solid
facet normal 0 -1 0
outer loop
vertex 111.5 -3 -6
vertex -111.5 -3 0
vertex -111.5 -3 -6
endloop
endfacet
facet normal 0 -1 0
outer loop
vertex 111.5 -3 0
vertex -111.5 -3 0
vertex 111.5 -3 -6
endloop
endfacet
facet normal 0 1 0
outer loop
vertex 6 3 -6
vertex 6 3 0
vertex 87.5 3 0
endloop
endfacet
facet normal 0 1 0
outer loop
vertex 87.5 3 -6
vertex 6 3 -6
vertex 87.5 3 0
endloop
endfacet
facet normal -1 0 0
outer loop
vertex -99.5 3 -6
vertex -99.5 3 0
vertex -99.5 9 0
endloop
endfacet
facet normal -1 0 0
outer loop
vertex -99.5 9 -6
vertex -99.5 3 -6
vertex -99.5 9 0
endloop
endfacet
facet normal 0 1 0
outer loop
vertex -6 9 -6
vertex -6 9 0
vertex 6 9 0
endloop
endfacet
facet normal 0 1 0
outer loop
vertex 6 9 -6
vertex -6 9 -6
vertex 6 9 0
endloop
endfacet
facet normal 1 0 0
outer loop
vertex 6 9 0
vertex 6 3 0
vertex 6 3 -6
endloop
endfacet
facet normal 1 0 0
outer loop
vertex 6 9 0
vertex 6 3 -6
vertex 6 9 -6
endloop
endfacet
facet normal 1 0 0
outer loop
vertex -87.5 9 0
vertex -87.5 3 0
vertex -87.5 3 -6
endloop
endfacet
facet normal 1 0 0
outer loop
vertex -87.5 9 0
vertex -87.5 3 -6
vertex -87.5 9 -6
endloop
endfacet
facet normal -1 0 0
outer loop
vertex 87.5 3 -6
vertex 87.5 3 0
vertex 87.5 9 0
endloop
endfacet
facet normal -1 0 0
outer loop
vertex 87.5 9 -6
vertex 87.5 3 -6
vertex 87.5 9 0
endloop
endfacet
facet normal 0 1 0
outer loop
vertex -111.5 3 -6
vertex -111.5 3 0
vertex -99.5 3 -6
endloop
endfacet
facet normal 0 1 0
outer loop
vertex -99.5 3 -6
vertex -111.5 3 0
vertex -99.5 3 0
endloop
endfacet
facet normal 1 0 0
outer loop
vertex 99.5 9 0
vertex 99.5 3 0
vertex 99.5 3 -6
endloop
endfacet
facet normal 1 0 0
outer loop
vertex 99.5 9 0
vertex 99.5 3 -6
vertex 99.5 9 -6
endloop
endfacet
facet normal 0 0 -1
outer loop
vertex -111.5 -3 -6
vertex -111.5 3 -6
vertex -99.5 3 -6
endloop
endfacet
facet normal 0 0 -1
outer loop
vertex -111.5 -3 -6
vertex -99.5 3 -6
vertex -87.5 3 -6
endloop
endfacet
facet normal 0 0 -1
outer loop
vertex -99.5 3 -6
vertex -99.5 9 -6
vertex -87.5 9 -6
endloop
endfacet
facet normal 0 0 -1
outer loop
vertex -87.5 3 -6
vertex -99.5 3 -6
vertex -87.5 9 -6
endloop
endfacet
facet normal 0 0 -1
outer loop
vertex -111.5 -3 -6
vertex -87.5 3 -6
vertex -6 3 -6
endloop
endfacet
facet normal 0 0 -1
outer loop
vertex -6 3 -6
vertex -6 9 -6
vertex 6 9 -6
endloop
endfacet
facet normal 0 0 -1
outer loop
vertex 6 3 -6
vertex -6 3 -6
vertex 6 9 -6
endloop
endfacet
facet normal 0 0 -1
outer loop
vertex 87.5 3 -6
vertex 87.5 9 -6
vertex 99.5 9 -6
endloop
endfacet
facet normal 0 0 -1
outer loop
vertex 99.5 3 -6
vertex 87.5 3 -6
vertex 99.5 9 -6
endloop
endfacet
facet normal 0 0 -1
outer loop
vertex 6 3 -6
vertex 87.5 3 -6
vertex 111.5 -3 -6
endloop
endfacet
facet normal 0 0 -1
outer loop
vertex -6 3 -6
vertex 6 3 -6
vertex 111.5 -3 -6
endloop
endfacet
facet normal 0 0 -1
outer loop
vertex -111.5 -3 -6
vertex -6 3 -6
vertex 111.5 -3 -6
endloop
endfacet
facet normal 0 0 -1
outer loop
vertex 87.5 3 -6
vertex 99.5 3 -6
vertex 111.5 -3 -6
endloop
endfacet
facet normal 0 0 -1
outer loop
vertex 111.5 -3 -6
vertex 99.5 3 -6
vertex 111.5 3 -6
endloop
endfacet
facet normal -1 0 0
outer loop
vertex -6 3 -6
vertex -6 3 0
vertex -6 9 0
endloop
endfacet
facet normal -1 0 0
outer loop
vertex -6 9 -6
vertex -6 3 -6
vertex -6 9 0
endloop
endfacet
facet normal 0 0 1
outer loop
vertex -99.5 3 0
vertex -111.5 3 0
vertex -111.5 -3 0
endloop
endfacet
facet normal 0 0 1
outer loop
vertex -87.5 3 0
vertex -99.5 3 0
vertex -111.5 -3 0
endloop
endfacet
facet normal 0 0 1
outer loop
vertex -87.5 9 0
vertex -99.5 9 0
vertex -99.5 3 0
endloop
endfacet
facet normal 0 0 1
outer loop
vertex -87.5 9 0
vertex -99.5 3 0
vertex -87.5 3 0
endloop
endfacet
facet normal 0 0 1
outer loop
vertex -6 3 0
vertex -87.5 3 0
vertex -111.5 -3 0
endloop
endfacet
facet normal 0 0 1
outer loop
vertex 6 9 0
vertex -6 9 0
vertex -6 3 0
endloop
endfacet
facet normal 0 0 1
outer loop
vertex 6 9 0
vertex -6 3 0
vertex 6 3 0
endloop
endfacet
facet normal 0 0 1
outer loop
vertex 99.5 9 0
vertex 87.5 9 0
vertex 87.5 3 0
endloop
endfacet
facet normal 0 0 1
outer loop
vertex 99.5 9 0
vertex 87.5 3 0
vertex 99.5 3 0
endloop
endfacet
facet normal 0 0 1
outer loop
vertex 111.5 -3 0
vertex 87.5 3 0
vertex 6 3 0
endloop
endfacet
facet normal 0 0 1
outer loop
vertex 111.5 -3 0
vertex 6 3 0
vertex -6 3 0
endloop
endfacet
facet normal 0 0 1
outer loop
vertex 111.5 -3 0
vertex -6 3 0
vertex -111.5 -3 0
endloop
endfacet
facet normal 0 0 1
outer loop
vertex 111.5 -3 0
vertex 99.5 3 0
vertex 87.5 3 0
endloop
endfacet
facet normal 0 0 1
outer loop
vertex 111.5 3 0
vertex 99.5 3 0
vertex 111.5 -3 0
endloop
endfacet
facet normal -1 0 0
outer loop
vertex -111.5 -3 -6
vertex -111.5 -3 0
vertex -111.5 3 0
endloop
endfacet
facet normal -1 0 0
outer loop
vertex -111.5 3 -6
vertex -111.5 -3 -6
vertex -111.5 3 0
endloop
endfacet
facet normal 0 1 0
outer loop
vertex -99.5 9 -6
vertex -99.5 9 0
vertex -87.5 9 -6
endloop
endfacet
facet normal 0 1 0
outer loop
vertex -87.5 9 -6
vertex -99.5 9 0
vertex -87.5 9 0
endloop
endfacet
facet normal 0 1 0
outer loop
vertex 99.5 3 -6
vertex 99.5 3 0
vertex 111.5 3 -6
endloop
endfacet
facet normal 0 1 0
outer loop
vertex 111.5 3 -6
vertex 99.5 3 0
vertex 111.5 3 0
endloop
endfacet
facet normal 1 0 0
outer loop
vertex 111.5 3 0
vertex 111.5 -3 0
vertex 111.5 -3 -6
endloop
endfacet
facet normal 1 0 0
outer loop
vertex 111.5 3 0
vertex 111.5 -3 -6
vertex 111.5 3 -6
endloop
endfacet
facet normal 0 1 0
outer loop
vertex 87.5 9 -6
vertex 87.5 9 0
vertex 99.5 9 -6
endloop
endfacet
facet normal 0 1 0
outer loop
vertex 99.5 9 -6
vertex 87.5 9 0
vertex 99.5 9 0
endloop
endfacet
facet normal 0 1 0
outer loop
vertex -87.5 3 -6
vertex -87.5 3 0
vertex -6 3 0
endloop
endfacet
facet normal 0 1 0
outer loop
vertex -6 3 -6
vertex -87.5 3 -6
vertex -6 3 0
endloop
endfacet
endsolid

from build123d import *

# Parameters (mm, degrees)
SKETCH1_W           = 12
SKETCH1_H           = 6
SKETCH1_W_2         = 223
BOSS_EXTRUDE1_DEPTH = 6


with BuildPart() as part:
    # Sketch1 → Boss-Extrude1 (new body)
    with BuildSketch(Plane.XY):
        with Locations((-93.5, 6)):
            Rectangle(SKETCH1_W, SKETCH1_H)
        Rectangle(SKETCH1_W_2, SKETCH1_H)
        with Locations((0, 6)):
            Rectangle(SKETCH1_W, SKETCH1_H)
        with Locations((93.5, 6)):
            Rectangle(SKETCH1_W, SKETCH1_H)
    extrude(amount=-BOSS_EXTRUDE1_DEPTH)


solid = part.part
